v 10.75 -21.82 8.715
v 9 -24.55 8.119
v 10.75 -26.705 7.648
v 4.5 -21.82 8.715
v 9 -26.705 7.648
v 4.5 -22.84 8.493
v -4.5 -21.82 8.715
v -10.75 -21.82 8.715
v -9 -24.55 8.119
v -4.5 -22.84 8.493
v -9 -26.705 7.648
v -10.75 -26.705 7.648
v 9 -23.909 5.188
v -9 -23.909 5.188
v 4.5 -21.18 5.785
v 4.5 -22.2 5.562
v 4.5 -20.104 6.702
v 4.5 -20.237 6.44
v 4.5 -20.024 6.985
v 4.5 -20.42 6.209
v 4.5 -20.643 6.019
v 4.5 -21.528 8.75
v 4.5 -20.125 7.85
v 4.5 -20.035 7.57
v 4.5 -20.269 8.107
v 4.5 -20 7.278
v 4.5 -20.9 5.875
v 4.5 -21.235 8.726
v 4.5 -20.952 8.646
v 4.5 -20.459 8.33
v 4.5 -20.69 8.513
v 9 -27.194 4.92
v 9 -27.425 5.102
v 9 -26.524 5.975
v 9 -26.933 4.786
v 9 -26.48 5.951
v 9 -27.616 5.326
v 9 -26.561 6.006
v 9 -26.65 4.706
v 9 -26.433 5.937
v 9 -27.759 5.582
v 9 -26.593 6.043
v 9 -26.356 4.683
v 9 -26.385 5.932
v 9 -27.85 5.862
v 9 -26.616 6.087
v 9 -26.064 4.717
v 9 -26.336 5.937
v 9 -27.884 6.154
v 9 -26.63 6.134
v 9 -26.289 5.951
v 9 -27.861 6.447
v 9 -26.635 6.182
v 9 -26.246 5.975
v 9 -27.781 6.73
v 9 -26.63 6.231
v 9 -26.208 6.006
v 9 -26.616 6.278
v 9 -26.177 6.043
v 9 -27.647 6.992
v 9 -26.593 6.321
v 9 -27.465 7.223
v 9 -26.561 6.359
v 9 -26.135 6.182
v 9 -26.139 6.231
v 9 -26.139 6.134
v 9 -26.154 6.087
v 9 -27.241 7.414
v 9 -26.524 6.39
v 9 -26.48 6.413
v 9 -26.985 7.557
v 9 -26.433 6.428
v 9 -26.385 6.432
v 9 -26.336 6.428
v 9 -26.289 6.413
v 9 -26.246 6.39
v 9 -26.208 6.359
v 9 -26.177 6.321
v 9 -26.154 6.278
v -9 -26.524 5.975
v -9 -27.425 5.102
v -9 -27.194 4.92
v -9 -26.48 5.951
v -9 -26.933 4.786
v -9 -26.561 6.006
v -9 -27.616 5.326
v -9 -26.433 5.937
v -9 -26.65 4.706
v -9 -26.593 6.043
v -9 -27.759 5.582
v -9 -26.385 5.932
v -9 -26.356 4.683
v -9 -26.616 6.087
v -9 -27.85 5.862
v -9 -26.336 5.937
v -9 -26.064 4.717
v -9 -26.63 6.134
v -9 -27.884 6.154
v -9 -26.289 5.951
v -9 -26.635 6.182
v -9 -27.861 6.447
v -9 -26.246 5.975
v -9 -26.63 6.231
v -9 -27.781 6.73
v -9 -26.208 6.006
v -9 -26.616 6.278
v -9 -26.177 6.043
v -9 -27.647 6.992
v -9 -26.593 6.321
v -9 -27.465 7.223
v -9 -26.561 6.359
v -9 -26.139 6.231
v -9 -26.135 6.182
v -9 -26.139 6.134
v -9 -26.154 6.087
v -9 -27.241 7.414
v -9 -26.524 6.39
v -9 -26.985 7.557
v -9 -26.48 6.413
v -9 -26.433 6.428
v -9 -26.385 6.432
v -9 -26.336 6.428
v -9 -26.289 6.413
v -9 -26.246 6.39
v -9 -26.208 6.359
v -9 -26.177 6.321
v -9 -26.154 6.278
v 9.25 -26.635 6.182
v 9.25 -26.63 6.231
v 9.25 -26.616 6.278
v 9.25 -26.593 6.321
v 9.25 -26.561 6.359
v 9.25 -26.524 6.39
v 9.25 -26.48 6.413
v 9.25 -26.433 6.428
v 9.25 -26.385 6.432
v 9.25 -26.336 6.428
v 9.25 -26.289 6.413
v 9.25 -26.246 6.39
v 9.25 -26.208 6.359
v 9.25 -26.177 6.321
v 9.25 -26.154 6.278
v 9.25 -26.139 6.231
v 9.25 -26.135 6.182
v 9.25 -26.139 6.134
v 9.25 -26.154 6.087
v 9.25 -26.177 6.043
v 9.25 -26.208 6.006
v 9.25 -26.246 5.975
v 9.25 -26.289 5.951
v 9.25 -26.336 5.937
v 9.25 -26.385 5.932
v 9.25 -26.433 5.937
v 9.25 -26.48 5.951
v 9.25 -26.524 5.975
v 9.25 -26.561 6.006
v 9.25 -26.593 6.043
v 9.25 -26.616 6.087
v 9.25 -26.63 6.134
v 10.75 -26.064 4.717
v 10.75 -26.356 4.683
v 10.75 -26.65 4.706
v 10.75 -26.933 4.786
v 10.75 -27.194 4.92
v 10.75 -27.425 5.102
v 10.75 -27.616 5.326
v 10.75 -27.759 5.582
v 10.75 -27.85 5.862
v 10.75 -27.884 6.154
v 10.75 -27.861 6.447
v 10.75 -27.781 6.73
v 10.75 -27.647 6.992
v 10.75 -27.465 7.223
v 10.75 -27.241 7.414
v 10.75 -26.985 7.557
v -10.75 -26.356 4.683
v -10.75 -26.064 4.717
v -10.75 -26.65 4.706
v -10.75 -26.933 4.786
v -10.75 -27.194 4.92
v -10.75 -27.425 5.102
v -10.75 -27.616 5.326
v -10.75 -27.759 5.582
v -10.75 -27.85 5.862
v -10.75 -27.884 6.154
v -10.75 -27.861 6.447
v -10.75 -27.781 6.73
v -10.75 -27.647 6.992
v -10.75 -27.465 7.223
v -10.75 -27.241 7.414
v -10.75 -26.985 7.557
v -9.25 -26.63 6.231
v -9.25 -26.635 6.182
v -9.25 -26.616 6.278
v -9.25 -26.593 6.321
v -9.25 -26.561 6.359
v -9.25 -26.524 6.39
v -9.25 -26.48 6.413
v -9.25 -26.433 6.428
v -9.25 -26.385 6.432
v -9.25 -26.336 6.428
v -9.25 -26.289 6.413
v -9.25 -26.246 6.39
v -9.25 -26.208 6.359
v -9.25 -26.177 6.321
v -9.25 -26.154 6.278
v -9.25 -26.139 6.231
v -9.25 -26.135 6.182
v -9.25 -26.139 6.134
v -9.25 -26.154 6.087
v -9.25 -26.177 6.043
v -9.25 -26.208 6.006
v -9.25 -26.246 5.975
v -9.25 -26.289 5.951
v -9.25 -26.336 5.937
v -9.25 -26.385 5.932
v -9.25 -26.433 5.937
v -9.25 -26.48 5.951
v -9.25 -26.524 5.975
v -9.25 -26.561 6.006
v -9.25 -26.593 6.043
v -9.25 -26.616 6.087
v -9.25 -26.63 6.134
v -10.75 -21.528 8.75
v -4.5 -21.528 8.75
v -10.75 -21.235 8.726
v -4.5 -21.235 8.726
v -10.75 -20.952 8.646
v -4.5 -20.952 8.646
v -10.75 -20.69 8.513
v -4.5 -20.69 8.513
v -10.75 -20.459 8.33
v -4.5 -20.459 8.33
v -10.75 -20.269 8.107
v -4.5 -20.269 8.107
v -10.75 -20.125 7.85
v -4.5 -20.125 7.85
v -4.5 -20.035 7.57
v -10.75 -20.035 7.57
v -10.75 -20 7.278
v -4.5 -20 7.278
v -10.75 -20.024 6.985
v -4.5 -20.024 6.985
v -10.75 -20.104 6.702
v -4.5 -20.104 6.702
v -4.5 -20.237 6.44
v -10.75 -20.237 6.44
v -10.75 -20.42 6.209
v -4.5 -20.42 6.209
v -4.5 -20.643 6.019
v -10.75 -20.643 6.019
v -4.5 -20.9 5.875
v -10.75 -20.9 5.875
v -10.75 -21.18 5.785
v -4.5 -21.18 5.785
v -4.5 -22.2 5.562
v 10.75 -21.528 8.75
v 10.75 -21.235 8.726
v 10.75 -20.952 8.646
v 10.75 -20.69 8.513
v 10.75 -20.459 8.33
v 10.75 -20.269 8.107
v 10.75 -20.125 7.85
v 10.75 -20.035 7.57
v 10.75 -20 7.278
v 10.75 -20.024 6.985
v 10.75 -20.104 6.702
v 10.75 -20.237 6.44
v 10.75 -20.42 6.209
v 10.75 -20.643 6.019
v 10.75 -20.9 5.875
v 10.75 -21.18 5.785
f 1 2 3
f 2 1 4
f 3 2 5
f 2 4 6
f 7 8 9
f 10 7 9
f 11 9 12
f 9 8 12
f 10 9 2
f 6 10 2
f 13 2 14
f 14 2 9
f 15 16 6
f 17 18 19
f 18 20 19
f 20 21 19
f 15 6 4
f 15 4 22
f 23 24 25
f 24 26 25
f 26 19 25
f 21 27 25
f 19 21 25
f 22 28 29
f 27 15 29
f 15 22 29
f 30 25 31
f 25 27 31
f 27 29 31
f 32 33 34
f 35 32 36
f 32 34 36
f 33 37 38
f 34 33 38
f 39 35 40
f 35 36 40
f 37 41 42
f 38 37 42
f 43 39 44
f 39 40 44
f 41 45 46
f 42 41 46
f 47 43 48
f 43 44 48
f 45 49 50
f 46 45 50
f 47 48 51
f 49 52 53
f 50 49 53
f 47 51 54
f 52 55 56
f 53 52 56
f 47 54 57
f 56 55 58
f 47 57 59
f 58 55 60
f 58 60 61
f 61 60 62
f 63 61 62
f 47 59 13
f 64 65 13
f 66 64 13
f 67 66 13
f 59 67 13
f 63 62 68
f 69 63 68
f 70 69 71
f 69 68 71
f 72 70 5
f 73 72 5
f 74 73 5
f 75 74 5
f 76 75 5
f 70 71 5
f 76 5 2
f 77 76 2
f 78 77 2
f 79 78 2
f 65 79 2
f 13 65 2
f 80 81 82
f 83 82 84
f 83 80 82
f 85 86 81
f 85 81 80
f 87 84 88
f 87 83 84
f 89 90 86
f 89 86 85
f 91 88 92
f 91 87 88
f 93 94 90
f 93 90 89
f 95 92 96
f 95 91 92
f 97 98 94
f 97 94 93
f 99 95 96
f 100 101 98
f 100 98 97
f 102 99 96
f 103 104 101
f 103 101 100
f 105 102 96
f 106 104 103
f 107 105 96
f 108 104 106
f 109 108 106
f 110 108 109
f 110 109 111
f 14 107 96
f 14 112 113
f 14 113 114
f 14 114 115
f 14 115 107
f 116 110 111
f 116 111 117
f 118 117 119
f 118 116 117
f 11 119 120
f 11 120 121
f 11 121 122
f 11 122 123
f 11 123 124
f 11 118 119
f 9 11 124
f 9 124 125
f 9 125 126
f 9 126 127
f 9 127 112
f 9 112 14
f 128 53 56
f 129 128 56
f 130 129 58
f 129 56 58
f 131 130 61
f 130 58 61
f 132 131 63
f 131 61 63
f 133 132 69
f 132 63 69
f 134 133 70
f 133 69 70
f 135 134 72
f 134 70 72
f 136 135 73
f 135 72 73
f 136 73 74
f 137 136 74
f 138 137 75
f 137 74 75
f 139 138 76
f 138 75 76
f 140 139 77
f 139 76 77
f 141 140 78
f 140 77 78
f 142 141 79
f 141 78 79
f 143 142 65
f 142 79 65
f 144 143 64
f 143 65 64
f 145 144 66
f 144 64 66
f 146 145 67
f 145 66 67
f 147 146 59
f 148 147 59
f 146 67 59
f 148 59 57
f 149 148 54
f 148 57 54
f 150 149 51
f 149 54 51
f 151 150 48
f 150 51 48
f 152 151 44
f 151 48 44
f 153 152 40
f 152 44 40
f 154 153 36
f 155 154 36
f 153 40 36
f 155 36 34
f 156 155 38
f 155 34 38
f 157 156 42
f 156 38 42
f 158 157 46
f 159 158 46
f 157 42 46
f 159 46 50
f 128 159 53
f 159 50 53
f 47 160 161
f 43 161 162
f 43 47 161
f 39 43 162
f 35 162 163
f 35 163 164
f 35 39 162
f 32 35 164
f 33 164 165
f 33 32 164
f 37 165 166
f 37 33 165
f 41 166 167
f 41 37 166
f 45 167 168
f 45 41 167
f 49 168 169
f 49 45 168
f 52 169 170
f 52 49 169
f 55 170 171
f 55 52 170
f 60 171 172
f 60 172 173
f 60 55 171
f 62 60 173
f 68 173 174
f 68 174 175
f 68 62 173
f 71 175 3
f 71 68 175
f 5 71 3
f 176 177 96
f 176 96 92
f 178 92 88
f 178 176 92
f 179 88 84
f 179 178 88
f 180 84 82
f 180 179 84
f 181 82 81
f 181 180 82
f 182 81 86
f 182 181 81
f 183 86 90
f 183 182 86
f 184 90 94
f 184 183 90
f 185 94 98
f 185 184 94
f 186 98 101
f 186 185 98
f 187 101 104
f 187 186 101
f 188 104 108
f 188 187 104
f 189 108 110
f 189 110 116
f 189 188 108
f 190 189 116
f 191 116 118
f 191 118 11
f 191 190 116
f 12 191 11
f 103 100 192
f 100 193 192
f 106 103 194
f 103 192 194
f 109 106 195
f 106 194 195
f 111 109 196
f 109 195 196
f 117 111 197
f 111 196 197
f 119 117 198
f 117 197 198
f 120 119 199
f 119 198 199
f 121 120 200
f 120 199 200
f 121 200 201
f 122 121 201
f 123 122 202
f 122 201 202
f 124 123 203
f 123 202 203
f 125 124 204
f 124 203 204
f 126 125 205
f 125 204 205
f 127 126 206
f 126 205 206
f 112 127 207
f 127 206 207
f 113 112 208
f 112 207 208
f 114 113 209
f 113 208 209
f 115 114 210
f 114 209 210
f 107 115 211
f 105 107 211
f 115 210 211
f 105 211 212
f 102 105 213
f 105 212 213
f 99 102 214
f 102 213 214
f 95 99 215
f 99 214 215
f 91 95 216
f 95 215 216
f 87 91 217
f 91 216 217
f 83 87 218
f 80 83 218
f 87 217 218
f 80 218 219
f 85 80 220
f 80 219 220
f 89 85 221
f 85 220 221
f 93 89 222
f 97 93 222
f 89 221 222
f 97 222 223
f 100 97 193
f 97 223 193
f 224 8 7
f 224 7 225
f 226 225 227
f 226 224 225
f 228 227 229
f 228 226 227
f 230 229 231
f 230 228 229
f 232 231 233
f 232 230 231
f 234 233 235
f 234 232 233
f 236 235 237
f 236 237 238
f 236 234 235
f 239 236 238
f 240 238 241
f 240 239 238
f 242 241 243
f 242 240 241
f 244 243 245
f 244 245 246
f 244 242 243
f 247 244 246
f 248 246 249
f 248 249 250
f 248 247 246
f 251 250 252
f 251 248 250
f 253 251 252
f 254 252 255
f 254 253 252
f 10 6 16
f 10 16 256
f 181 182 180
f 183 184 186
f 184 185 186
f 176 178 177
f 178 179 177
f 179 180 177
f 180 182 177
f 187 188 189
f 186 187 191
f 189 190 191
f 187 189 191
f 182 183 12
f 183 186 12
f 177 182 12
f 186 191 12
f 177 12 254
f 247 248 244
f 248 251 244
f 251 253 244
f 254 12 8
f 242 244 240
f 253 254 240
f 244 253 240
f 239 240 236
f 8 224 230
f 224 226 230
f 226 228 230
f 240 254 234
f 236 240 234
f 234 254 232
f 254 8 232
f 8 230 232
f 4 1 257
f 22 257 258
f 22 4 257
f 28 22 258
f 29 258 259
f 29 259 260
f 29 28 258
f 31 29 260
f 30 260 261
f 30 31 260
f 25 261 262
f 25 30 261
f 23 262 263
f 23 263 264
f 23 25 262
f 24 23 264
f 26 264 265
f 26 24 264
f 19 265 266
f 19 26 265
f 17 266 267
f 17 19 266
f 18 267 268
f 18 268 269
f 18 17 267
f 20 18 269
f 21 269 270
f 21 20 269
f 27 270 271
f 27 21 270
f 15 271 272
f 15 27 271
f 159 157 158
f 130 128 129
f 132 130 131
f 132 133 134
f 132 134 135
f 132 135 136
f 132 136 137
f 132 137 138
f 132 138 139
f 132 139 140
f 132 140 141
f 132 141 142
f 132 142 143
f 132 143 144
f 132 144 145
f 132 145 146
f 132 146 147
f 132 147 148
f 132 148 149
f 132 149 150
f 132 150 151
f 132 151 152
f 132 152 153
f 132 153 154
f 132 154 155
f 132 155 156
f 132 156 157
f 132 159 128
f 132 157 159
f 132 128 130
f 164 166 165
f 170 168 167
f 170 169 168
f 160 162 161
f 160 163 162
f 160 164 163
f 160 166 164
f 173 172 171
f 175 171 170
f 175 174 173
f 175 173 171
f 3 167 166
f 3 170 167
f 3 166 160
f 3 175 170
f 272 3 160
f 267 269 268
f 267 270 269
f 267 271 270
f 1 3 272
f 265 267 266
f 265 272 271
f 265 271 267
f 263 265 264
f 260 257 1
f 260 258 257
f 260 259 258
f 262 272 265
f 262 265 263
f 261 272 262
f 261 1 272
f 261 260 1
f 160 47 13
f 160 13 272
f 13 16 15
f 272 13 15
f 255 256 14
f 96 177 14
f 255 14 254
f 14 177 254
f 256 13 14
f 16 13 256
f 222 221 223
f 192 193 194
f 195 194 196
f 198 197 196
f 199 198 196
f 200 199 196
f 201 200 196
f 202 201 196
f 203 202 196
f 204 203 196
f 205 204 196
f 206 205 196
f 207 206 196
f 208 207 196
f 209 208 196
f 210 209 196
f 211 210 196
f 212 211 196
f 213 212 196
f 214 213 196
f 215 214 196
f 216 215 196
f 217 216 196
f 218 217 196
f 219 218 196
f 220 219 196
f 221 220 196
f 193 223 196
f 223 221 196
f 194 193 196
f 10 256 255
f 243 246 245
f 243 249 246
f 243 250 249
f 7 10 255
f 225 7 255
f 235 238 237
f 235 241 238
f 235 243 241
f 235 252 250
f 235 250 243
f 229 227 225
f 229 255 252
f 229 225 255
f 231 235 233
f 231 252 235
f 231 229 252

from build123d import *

# Parameters (mm, degrees)
PAD002_DEPTH          = 10.75
SKETCH034_W           = 20.5
SKETCH034_H           = 9
SKETCH034_W_2         = 10
SKETCH034_H_2         = 18
POCKET004_DEPTH       = 5
SKETCH035_R           = 0.25
POCKET005_DEPTH       = 9.25
CLONE_PLACEMENT_ANGLE = 180


with BuildPart() as part:
    # Sketch033 → Pad002 (new body, symmetric)
    with BuildSketch(Plane.YZ):
        with BuildLine():
            Line((21.8202830187, 8.7154073795), (26.7049742837, 7.6477973171))
            ThreePointArc((26.0644082463, 4.7169825581), (27.8500986445, 5.8621069189), (26.7049742837, 7.6477973171))
            Line((26.0644082463, 4.7169825581), (21.1797169813, 5.7845926205))
            ThreePointArc((21.8202830187, 8.7154073795), (20.0345926205, 7.5702830187), (21.1797169813, 5.7845926205))
        make_face()
    extrude(amount=PAD002_DEPTH, both=True)

    # Sketch034 (on Face3 of Pad002) → Pocket004 (cut)
    with BuildSketch(Plane(origin=(0, 2.812837698, 12.869721088), x_dir=(0, -0.976938253, 0.2135220125), z_dir=(0, 0.2135220125, 0.976938253))):
        with Locations((-10.25, 0)):
            Rectangle(SKETCH034_W, SKETCH034_H)
        with Locations((-27.25, 0)):
            Rectangle(SKETCH034_W_2, SKETCH034_H_2)
    extrude(amount=-POCKET004_DEPTH, mode=Mode.SUBTRACT)

    # Sketch035 → Pocket005 (cut, symmetric)
    with BuildSketch(Plane.YZ):
        with Locations((26.384691265, 6.1823899376)):
            Circle(SKETCH035_R)
    extrude(amount=POCKET005_DEPTH, both=True, mode=Mode.SUBTRACT)


with BuildPart() as part_1:
    # Clone placement: moved
    add(part.part.rotate(Axis((0, 0, 0), (0, 0, 1)), CLONE_PLACEMENT_ANGLE))


solid = part_1.part
